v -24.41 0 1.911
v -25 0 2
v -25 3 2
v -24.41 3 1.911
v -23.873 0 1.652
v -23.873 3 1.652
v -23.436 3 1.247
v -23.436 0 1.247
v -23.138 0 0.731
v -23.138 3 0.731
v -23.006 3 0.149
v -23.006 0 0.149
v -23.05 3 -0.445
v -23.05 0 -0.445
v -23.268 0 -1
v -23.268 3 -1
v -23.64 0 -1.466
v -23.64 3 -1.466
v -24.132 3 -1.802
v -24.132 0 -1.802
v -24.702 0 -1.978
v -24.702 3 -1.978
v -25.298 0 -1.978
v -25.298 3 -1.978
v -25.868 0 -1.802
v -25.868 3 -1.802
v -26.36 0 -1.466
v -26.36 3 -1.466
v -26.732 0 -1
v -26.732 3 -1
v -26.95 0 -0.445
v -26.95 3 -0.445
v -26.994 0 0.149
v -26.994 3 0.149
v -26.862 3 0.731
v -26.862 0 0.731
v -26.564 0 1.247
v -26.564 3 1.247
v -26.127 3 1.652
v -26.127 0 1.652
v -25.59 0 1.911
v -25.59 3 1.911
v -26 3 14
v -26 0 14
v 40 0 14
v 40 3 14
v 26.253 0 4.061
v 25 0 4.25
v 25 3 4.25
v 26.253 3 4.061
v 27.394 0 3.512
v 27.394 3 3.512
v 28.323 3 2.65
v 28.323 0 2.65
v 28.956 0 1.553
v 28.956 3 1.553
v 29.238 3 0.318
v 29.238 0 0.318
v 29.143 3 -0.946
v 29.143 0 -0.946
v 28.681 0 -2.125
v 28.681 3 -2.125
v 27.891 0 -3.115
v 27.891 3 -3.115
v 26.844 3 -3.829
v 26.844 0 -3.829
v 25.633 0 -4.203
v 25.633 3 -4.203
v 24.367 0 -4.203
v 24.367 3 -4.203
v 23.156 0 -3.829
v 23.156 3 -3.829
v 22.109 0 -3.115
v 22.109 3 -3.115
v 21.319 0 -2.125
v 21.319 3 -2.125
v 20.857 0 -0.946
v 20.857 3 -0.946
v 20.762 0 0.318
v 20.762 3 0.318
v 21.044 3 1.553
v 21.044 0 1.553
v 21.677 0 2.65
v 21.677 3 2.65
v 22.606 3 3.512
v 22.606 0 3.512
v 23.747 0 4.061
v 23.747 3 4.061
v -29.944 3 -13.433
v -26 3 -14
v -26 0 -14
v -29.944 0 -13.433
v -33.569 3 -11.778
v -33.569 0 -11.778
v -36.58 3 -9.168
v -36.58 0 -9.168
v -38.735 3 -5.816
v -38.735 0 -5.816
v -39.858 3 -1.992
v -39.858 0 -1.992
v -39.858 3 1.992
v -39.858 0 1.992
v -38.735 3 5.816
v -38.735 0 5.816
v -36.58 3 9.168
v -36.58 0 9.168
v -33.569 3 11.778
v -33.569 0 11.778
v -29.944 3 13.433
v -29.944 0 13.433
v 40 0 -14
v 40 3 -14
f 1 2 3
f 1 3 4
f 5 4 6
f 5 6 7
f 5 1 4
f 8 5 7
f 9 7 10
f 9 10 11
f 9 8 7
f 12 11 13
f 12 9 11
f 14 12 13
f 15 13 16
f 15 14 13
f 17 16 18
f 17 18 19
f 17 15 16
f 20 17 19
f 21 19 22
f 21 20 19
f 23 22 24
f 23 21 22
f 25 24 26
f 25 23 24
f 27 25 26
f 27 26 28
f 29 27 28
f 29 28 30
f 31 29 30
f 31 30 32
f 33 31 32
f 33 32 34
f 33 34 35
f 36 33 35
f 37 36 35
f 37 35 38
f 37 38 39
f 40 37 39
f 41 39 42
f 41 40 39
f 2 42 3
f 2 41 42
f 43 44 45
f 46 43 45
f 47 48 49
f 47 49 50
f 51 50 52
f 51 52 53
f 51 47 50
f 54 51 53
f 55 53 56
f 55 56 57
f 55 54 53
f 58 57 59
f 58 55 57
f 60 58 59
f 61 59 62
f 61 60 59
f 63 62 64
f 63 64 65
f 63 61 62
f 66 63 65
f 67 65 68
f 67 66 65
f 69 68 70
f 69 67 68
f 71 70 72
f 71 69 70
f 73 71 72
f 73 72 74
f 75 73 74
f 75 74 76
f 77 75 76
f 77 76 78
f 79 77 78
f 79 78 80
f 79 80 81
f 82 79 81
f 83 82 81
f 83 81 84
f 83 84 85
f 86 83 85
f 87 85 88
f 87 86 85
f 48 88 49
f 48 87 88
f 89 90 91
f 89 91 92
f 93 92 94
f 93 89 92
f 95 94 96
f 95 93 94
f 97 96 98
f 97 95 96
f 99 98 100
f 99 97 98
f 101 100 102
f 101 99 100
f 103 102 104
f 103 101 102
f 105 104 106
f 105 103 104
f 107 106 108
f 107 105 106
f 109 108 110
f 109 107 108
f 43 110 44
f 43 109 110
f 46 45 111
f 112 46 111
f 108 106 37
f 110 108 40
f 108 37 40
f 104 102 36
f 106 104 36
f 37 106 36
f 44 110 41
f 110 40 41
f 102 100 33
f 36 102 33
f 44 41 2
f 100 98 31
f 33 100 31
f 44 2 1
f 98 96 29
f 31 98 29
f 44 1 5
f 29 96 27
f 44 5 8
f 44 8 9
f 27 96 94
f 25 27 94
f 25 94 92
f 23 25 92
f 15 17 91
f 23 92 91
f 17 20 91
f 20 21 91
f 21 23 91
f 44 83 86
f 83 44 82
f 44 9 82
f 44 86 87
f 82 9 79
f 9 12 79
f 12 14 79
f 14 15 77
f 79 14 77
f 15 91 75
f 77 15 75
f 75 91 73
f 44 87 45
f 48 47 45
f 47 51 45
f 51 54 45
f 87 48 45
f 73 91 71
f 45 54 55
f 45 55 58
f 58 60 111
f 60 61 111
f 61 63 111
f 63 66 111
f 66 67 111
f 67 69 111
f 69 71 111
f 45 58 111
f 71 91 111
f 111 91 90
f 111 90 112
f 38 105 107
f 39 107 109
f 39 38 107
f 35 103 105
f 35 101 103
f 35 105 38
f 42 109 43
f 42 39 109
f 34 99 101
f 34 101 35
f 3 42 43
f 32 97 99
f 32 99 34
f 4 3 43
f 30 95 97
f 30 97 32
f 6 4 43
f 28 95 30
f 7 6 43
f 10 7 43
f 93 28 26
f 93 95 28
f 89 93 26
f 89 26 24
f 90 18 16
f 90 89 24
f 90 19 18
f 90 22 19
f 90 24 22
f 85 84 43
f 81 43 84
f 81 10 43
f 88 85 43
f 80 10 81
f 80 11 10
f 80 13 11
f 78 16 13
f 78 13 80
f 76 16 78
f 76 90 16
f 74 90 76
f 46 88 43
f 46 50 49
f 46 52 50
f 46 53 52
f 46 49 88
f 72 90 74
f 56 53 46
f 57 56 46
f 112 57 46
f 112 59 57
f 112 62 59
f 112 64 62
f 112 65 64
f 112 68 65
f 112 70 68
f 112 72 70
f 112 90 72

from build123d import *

# Parameters (mm, degrees)
SKETCH_1_W      = 80
SKETCH_1_H      = 28
SKETCH_1_R      = 4.25
SKETCH_1_R_2    = 2
EXTRUDE_1_DEPTH = 3
FILLET_1_RADIUS = 14
FILLET_1_LENGTH = 3


with BuildPart() as part:
    # 草图1 → 凸台-拉伸1 (new body)
    with BuildSketch(Plane(origin=(0, 0, 0), x_dir=(1, 0, 0), z_dir=(0, 1, 0))):
        Rectangle(SKETCH_1_W, SKETCH_1_H)
        with Locations(Location((25, 0, 0), (0, 0, 270))):
            Circle(SKETCH_1_R, mode=Mode.SUBTRACT)
        with Locations(Location((-25, 0, 0), (0, 0, 270))):
            Circle(SKETCH_1_R_2, mode=Mode.SUBTRACT)
    extrude(amount=EXTRUDE_1_DEPTH)

    # 圆角1: full round fillet: the end face becomes a half cylinder, R = half its width
    fillet_1_face = Plane((-40, 1.5, 0), x_dir=(0, 1, 0), z_dir=(-1, 0, 0))  # on the end face: x along it, z out of the body
    fillet_1_slab = fillet_1_face.offset(-FILLET_1_RADIUS / 2) * Box(FILLET_1_LENGTH, 2 * FILLET_1_RADIUS, FILLET_1_RADIUS, mode=Mode.PRIVATE)  # the body's end, R deep
    fillet_1_round = Plane((-26, 1.5, 0), x_dir=(-1, 0, 0), z_dir=(0, 1, 0)) * Cylinder(FILLET_1_RADIUS, FILLET_1_LENGTH, mode=Mode.PRIVATE)  # its axis R under the face
    add(fillet_1_slab - fillet_1_round, mode=Mode.SUBTRACT)


solid = part.part
